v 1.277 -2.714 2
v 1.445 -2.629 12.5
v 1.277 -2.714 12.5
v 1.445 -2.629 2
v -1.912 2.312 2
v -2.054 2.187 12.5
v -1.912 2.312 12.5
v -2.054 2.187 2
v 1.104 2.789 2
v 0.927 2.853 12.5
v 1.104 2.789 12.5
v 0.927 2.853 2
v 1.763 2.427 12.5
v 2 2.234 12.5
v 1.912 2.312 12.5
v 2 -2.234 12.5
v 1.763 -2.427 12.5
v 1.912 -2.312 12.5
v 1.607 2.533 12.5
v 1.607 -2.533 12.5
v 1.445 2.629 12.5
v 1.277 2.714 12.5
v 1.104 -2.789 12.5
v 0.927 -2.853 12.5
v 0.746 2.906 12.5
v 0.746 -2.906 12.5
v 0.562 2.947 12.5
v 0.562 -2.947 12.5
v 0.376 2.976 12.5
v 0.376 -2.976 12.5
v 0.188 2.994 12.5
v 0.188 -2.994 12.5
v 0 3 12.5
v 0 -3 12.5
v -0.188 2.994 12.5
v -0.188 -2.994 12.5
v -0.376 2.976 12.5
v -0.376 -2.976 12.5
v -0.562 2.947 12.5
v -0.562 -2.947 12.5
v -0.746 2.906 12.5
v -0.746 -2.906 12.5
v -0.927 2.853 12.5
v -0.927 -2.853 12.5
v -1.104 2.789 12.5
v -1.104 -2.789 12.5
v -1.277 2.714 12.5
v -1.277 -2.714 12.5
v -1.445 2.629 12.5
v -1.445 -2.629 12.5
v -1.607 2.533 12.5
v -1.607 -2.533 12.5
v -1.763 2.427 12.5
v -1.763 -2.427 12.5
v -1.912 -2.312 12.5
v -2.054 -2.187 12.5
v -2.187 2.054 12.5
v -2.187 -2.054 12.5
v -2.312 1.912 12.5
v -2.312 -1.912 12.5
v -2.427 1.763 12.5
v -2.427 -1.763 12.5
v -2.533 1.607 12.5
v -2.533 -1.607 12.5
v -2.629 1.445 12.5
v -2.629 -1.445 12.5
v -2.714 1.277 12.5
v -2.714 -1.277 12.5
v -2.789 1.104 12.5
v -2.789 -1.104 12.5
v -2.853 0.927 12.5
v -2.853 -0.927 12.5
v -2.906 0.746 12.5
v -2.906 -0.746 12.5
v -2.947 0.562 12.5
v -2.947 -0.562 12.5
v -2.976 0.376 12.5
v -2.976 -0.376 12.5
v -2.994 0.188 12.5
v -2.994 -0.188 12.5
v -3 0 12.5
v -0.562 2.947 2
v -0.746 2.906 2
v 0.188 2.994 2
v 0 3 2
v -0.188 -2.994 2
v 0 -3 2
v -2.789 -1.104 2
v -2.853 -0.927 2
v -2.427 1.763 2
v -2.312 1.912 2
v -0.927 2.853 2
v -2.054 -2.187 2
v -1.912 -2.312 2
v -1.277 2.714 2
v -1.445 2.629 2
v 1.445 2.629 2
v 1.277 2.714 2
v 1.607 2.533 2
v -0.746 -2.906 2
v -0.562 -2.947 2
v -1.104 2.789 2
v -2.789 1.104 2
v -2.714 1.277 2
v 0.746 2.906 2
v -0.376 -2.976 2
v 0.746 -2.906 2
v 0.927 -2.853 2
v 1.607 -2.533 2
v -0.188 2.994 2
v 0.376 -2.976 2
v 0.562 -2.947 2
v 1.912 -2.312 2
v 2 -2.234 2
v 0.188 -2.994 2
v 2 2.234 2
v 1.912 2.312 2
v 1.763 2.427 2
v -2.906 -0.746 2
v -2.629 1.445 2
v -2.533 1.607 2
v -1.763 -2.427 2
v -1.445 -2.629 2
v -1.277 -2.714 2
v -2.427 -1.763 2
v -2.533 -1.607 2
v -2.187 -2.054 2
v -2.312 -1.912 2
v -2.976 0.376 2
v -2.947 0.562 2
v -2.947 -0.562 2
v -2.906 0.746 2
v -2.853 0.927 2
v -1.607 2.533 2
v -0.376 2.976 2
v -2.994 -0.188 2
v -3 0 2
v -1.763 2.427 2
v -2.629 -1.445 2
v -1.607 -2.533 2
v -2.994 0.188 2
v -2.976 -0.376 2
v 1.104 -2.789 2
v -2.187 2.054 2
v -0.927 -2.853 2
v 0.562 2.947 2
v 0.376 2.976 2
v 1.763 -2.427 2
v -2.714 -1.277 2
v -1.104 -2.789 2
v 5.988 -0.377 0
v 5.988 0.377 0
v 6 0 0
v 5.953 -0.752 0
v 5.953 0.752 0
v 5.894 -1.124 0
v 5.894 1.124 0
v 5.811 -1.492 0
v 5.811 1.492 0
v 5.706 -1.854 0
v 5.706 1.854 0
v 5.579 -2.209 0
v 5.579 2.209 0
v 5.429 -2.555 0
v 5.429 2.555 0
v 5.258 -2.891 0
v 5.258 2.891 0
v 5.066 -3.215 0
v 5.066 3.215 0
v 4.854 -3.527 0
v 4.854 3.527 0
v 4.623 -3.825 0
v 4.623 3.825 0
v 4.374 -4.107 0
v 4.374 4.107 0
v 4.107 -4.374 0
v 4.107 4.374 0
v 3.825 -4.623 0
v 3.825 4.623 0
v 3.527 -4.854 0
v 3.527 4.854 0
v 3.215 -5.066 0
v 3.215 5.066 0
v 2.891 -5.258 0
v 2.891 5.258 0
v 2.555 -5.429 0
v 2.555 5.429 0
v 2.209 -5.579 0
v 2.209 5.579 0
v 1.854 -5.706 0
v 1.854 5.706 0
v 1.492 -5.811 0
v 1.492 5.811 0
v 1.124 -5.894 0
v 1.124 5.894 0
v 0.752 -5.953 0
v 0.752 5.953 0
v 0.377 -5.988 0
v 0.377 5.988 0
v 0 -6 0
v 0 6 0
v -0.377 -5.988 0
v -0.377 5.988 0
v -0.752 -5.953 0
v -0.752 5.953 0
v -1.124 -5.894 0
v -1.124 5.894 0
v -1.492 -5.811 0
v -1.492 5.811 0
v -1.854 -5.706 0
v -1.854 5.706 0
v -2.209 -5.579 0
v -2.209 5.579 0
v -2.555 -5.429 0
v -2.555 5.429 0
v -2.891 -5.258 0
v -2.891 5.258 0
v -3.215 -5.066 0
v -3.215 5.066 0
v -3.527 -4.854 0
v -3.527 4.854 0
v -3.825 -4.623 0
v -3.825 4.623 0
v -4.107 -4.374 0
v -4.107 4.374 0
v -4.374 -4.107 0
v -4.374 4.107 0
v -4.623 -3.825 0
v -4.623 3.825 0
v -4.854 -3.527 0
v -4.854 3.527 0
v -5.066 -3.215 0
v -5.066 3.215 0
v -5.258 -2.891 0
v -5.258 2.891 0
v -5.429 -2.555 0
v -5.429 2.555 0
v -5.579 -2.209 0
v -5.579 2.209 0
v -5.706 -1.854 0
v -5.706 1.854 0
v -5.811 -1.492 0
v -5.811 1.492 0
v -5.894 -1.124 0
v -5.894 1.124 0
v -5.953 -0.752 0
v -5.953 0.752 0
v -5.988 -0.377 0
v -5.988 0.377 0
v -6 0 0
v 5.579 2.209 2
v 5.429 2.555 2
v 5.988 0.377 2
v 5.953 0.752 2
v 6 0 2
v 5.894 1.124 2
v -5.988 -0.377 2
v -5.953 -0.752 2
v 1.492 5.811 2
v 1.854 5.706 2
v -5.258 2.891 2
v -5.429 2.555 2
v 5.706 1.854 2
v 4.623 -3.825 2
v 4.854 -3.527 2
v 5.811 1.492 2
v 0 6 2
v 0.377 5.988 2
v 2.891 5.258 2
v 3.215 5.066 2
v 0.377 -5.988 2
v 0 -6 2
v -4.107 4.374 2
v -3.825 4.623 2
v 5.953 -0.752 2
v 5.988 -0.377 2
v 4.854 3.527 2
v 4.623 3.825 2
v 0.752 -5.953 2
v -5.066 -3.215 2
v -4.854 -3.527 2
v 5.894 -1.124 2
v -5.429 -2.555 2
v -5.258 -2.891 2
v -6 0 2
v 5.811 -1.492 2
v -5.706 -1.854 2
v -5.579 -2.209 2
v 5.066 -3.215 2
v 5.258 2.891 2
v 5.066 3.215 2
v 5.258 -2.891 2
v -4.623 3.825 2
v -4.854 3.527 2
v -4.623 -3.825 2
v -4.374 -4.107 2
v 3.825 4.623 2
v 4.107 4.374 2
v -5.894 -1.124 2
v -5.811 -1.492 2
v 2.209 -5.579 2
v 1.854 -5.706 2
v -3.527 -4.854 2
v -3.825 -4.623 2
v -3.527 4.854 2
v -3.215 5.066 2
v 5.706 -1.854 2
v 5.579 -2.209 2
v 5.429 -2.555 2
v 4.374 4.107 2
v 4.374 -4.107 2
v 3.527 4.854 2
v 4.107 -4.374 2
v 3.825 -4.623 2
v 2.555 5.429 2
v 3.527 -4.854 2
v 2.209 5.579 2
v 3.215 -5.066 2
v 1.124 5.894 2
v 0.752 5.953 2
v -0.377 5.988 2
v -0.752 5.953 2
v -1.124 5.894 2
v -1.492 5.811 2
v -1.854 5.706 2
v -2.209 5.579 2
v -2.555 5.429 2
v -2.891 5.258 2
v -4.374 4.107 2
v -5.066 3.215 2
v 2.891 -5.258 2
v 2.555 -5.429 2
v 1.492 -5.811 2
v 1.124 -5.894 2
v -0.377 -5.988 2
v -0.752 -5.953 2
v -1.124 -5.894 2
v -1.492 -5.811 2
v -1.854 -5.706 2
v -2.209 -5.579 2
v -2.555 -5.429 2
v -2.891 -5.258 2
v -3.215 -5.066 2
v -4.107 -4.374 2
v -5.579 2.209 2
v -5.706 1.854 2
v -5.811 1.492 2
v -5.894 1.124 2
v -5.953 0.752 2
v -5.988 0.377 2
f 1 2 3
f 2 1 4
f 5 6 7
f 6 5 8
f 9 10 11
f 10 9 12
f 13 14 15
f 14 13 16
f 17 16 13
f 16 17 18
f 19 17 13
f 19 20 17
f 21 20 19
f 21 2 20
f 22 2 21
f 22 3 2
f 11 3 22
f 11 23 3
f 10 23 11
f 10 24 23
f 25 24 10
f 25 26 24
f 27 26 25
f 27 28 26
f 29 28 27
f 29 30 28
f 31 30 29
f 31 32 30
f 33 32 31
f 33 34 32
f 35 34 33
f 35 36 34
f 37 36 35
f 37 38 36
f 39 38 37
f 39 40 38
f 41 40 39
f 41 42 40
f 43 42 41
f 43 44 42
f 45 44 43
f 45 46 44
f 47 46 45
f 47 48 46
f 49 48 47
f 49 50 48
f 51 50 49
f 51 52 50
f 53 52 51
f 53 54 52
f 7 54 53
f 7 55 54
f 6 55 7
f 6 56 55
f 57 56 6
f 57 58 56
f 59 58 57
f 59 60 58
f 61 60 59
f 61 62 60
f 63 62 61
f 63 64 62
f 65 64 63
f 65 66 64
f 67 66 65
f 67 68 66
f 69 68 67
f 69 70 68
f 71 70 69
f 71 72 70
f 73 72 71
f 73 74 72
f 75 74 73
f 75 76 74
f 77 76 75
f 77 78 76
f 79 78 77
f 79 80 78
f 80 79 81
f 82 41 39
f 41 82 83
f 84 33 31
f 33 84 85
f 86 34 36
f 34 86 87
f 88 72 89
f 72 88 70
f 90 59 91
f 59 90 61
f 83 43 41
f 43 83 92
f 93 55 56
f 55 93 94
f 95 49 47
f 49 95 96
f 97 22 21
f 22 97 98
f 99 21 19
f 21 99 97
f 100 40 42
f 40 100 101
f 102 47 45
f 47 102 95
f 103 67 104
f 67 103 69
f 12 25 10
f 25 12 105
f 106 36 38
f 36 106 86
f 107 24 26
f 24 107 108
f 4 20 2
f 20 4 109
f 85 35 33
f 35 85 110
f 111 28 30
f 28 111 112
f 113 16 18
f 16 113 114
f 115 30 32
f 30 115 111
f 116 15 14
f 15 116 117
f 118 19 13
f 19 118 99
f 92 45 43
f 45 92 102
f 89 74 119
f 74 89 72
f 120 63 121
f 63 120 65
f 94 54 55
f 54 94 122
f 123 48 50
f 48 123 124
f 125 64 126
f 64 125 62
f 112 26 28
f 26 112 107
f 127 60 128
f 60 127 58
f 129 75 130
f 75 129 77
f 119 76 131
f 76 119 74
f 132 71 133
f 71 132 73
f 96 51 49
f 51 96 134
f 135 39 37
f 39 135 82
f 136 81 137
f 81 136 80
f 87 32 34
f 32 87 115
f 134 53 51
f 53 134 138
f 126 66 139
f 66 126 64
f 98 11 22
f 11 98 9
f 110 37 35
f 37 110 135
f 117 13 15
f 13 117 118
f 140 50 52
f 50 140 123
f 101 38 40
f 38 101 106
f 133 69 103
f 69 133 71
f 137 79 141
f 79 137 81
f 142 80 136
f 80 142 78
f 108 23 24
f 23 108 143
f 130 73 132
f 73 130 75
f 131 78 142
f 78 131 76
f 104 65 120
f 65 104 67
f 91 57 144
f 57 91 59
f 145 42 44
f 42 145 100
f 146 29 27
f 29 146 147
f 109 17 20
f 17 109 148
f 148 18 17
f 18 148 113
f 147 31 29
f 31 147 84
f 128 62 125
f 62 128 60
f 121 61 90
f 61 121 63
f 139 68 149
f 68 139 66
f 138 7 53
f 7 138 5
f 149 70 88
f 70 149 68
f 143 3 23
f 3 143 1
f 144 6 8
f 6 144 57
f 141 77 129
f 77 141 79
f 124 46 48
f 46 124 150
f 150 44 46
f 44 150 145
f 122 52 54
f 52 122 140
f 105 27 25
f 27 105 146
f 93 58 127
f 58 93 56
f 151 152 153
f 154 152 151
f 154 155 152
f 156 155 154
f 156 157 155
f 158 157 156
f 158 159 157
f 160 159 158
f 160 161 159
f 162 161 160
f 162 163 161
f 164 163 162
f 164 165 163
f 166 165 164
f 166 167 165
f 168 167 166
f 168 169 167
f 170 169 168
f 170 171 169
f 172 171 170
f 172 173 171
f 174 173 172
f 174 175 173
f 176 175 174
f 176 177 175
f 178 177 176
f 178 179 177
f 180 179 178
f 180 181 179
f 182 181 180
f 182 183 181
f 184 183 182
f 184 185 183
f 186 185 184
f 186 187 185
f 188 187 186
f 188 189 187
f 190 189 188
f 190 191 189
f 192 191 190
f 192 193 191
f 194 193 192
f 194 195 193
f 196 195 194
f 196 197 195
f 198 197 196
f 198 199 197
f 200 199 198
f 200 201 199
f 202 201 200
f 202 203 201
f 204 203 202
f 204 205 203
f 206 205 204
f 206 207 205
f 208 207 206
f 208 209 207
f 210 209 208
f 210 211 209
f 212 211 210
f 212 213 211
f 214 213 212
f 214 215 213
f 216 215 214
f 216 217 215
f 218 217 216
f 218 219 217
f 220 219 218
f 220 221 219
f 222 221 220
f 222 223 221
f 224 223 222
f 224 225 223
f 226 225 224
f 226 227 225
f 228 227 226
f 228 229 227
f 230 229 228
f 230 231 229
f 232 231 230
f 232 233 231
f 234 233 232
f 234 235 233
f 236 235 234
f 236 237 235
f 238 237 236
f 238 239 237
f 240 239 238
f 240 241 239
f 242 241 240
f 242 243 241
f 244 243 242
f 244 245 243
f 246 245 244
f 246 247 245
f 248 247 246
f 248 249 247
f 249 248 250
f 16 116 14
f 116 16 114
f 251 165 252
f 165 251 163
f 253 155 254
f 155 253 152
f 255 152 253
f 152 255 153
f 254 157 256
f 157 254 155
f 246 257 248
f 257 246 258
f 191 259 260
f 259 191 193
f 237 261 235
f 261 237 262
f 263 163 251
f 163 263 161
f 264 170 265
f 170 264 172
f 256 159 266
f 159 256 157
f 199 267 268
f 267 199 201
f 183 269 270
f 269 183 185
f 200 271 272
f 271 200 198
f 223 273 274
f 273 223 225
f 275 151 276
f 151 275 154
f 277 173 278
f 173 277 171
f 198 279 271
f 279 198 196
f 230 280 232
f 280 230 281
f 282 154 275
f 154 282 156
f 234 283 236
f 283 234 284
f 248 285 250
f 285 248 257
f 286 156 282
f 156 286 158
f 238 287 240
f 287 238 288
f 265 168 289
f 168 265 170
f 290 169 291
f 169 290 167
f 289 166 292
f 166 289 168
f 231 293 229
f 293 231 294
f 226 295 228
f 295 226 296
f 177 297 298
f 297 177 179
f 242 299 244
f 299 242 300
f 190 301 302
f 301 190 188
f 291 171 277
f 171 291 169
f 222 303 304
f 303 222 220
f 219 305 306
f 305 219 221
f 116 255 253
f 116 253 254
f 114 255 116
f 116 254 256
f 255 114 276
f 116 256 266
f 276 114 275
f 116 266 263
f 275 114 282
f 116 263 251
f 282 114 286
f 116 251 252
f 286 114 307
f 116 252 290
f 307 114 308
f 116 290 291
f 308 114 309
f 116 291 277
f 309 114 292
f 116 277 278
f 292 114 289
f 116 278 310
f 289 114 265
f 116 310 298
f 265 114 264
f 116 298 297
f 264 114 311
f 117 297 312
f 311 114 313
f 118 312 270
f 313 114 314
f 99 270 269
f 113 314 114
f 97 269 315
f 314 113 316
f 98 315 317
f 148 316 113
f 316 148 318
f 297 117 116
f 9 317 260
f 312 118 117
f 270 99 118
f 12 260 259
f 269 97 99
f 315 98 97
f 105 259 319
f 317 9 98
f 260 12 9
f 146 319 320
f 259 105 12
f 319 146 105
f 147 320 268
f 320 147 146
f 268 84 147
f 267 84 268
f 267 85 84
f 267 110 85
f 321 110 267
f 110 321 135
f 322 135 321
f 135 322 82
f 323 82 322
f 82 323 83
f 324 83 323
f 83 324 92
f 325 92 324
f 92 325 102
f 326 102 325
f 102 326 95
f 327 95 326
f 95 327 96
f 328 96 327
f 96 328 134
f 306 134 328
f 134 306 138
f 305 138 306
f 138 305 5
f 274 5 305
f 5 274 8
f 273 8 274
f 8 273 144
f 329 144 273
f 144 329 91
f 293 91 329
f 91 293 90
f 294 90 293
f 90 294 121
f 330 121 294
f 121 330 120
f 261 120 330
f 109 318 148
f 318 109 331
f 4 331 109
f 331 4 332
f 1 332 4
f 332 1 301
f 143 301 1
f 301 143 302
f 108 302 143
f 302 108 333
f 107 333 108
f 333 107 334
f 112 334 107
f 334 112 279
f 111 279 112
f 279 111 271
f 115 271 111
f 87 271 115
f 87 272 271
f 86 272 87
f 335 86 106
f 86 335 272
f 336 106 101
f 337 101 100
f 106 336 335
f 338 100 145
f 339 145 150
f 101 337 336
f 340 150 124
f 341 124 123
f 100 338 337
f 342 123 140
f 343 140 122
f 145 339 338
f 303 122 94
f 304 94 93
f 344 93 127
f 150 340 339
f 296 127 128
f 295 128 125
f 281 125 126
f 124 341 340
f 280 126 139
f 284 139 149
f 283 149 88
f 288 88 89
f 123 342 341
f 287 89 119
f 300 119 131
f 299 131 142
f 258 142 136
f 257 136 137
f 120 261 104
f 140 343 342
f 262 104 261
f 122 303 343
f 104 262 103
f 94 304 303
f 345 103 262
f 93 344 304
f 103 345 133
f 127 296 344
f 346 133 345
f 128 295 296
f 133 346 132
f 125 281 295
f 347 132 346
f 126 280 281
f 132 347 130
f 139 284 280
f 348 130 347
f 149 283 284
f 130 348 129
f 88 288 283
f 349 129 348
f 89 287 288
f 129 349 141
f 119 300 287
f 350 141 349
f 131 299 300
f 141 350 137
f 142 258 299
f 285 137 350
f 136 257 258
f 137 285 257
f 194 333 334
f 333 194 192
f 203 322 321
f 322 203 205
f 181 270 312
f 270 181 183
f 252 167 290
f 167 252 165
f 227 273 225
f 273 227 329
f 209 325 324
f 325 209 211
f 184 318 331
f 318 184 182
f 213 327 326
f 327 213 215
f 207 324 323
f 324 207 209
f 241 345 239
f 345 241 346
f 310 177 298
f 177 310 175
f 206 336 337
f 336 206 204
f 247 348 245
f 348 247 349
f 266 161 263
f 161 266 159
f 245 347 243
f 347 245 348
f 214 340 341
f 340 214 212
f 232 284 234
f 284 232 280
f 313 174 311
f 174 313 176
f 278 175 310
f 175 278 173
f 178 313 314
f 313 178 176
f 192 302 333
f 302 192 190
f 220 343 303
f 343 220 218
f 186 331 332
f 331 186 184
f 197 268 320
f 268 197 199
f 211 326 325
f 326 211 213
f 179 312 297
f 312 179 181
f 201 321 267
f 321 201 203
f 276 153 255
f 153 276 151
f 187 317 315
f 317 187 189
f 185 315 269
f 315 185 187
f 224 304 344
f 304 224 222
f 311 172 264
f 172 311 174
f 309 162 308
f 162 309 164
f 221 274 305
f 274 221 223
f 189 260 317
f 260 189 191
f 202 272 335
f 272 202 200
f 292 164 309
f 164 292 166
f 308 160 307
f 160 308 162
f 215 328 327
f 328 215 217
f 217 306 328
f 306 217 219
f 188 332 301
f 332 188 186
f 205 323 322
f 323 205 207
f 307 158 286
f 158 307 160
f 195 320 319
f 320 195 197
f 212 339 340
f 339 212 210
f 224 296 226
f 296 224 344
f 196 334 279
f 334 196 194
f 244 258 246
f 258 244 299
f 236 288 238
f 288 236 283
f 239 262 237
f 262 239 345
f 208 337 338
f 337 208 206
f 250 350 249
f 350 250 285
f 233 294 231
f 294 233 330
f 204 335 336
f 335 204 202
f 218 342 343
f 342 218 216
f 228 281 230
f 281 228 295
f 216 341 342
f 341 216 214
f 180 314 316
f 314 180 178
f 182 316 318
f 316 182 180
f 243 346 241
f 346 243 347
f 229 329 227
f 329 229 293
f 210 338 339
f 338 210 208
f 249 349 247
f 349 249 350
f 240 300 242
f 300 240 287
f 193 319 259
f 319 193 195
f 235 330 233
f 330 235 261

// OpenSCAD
fn = 100;
d = 6;
h = 12.5;

difference(){
    //Base
    cylinder(d= d, h = h, $fn = fn);
    //Screw part
    translate([d/2,0,h/2])
    cube(size = [d/3,d,h+1], center = true);
}
    cylinder(d= d*2, h = 2, $fn = fn);
